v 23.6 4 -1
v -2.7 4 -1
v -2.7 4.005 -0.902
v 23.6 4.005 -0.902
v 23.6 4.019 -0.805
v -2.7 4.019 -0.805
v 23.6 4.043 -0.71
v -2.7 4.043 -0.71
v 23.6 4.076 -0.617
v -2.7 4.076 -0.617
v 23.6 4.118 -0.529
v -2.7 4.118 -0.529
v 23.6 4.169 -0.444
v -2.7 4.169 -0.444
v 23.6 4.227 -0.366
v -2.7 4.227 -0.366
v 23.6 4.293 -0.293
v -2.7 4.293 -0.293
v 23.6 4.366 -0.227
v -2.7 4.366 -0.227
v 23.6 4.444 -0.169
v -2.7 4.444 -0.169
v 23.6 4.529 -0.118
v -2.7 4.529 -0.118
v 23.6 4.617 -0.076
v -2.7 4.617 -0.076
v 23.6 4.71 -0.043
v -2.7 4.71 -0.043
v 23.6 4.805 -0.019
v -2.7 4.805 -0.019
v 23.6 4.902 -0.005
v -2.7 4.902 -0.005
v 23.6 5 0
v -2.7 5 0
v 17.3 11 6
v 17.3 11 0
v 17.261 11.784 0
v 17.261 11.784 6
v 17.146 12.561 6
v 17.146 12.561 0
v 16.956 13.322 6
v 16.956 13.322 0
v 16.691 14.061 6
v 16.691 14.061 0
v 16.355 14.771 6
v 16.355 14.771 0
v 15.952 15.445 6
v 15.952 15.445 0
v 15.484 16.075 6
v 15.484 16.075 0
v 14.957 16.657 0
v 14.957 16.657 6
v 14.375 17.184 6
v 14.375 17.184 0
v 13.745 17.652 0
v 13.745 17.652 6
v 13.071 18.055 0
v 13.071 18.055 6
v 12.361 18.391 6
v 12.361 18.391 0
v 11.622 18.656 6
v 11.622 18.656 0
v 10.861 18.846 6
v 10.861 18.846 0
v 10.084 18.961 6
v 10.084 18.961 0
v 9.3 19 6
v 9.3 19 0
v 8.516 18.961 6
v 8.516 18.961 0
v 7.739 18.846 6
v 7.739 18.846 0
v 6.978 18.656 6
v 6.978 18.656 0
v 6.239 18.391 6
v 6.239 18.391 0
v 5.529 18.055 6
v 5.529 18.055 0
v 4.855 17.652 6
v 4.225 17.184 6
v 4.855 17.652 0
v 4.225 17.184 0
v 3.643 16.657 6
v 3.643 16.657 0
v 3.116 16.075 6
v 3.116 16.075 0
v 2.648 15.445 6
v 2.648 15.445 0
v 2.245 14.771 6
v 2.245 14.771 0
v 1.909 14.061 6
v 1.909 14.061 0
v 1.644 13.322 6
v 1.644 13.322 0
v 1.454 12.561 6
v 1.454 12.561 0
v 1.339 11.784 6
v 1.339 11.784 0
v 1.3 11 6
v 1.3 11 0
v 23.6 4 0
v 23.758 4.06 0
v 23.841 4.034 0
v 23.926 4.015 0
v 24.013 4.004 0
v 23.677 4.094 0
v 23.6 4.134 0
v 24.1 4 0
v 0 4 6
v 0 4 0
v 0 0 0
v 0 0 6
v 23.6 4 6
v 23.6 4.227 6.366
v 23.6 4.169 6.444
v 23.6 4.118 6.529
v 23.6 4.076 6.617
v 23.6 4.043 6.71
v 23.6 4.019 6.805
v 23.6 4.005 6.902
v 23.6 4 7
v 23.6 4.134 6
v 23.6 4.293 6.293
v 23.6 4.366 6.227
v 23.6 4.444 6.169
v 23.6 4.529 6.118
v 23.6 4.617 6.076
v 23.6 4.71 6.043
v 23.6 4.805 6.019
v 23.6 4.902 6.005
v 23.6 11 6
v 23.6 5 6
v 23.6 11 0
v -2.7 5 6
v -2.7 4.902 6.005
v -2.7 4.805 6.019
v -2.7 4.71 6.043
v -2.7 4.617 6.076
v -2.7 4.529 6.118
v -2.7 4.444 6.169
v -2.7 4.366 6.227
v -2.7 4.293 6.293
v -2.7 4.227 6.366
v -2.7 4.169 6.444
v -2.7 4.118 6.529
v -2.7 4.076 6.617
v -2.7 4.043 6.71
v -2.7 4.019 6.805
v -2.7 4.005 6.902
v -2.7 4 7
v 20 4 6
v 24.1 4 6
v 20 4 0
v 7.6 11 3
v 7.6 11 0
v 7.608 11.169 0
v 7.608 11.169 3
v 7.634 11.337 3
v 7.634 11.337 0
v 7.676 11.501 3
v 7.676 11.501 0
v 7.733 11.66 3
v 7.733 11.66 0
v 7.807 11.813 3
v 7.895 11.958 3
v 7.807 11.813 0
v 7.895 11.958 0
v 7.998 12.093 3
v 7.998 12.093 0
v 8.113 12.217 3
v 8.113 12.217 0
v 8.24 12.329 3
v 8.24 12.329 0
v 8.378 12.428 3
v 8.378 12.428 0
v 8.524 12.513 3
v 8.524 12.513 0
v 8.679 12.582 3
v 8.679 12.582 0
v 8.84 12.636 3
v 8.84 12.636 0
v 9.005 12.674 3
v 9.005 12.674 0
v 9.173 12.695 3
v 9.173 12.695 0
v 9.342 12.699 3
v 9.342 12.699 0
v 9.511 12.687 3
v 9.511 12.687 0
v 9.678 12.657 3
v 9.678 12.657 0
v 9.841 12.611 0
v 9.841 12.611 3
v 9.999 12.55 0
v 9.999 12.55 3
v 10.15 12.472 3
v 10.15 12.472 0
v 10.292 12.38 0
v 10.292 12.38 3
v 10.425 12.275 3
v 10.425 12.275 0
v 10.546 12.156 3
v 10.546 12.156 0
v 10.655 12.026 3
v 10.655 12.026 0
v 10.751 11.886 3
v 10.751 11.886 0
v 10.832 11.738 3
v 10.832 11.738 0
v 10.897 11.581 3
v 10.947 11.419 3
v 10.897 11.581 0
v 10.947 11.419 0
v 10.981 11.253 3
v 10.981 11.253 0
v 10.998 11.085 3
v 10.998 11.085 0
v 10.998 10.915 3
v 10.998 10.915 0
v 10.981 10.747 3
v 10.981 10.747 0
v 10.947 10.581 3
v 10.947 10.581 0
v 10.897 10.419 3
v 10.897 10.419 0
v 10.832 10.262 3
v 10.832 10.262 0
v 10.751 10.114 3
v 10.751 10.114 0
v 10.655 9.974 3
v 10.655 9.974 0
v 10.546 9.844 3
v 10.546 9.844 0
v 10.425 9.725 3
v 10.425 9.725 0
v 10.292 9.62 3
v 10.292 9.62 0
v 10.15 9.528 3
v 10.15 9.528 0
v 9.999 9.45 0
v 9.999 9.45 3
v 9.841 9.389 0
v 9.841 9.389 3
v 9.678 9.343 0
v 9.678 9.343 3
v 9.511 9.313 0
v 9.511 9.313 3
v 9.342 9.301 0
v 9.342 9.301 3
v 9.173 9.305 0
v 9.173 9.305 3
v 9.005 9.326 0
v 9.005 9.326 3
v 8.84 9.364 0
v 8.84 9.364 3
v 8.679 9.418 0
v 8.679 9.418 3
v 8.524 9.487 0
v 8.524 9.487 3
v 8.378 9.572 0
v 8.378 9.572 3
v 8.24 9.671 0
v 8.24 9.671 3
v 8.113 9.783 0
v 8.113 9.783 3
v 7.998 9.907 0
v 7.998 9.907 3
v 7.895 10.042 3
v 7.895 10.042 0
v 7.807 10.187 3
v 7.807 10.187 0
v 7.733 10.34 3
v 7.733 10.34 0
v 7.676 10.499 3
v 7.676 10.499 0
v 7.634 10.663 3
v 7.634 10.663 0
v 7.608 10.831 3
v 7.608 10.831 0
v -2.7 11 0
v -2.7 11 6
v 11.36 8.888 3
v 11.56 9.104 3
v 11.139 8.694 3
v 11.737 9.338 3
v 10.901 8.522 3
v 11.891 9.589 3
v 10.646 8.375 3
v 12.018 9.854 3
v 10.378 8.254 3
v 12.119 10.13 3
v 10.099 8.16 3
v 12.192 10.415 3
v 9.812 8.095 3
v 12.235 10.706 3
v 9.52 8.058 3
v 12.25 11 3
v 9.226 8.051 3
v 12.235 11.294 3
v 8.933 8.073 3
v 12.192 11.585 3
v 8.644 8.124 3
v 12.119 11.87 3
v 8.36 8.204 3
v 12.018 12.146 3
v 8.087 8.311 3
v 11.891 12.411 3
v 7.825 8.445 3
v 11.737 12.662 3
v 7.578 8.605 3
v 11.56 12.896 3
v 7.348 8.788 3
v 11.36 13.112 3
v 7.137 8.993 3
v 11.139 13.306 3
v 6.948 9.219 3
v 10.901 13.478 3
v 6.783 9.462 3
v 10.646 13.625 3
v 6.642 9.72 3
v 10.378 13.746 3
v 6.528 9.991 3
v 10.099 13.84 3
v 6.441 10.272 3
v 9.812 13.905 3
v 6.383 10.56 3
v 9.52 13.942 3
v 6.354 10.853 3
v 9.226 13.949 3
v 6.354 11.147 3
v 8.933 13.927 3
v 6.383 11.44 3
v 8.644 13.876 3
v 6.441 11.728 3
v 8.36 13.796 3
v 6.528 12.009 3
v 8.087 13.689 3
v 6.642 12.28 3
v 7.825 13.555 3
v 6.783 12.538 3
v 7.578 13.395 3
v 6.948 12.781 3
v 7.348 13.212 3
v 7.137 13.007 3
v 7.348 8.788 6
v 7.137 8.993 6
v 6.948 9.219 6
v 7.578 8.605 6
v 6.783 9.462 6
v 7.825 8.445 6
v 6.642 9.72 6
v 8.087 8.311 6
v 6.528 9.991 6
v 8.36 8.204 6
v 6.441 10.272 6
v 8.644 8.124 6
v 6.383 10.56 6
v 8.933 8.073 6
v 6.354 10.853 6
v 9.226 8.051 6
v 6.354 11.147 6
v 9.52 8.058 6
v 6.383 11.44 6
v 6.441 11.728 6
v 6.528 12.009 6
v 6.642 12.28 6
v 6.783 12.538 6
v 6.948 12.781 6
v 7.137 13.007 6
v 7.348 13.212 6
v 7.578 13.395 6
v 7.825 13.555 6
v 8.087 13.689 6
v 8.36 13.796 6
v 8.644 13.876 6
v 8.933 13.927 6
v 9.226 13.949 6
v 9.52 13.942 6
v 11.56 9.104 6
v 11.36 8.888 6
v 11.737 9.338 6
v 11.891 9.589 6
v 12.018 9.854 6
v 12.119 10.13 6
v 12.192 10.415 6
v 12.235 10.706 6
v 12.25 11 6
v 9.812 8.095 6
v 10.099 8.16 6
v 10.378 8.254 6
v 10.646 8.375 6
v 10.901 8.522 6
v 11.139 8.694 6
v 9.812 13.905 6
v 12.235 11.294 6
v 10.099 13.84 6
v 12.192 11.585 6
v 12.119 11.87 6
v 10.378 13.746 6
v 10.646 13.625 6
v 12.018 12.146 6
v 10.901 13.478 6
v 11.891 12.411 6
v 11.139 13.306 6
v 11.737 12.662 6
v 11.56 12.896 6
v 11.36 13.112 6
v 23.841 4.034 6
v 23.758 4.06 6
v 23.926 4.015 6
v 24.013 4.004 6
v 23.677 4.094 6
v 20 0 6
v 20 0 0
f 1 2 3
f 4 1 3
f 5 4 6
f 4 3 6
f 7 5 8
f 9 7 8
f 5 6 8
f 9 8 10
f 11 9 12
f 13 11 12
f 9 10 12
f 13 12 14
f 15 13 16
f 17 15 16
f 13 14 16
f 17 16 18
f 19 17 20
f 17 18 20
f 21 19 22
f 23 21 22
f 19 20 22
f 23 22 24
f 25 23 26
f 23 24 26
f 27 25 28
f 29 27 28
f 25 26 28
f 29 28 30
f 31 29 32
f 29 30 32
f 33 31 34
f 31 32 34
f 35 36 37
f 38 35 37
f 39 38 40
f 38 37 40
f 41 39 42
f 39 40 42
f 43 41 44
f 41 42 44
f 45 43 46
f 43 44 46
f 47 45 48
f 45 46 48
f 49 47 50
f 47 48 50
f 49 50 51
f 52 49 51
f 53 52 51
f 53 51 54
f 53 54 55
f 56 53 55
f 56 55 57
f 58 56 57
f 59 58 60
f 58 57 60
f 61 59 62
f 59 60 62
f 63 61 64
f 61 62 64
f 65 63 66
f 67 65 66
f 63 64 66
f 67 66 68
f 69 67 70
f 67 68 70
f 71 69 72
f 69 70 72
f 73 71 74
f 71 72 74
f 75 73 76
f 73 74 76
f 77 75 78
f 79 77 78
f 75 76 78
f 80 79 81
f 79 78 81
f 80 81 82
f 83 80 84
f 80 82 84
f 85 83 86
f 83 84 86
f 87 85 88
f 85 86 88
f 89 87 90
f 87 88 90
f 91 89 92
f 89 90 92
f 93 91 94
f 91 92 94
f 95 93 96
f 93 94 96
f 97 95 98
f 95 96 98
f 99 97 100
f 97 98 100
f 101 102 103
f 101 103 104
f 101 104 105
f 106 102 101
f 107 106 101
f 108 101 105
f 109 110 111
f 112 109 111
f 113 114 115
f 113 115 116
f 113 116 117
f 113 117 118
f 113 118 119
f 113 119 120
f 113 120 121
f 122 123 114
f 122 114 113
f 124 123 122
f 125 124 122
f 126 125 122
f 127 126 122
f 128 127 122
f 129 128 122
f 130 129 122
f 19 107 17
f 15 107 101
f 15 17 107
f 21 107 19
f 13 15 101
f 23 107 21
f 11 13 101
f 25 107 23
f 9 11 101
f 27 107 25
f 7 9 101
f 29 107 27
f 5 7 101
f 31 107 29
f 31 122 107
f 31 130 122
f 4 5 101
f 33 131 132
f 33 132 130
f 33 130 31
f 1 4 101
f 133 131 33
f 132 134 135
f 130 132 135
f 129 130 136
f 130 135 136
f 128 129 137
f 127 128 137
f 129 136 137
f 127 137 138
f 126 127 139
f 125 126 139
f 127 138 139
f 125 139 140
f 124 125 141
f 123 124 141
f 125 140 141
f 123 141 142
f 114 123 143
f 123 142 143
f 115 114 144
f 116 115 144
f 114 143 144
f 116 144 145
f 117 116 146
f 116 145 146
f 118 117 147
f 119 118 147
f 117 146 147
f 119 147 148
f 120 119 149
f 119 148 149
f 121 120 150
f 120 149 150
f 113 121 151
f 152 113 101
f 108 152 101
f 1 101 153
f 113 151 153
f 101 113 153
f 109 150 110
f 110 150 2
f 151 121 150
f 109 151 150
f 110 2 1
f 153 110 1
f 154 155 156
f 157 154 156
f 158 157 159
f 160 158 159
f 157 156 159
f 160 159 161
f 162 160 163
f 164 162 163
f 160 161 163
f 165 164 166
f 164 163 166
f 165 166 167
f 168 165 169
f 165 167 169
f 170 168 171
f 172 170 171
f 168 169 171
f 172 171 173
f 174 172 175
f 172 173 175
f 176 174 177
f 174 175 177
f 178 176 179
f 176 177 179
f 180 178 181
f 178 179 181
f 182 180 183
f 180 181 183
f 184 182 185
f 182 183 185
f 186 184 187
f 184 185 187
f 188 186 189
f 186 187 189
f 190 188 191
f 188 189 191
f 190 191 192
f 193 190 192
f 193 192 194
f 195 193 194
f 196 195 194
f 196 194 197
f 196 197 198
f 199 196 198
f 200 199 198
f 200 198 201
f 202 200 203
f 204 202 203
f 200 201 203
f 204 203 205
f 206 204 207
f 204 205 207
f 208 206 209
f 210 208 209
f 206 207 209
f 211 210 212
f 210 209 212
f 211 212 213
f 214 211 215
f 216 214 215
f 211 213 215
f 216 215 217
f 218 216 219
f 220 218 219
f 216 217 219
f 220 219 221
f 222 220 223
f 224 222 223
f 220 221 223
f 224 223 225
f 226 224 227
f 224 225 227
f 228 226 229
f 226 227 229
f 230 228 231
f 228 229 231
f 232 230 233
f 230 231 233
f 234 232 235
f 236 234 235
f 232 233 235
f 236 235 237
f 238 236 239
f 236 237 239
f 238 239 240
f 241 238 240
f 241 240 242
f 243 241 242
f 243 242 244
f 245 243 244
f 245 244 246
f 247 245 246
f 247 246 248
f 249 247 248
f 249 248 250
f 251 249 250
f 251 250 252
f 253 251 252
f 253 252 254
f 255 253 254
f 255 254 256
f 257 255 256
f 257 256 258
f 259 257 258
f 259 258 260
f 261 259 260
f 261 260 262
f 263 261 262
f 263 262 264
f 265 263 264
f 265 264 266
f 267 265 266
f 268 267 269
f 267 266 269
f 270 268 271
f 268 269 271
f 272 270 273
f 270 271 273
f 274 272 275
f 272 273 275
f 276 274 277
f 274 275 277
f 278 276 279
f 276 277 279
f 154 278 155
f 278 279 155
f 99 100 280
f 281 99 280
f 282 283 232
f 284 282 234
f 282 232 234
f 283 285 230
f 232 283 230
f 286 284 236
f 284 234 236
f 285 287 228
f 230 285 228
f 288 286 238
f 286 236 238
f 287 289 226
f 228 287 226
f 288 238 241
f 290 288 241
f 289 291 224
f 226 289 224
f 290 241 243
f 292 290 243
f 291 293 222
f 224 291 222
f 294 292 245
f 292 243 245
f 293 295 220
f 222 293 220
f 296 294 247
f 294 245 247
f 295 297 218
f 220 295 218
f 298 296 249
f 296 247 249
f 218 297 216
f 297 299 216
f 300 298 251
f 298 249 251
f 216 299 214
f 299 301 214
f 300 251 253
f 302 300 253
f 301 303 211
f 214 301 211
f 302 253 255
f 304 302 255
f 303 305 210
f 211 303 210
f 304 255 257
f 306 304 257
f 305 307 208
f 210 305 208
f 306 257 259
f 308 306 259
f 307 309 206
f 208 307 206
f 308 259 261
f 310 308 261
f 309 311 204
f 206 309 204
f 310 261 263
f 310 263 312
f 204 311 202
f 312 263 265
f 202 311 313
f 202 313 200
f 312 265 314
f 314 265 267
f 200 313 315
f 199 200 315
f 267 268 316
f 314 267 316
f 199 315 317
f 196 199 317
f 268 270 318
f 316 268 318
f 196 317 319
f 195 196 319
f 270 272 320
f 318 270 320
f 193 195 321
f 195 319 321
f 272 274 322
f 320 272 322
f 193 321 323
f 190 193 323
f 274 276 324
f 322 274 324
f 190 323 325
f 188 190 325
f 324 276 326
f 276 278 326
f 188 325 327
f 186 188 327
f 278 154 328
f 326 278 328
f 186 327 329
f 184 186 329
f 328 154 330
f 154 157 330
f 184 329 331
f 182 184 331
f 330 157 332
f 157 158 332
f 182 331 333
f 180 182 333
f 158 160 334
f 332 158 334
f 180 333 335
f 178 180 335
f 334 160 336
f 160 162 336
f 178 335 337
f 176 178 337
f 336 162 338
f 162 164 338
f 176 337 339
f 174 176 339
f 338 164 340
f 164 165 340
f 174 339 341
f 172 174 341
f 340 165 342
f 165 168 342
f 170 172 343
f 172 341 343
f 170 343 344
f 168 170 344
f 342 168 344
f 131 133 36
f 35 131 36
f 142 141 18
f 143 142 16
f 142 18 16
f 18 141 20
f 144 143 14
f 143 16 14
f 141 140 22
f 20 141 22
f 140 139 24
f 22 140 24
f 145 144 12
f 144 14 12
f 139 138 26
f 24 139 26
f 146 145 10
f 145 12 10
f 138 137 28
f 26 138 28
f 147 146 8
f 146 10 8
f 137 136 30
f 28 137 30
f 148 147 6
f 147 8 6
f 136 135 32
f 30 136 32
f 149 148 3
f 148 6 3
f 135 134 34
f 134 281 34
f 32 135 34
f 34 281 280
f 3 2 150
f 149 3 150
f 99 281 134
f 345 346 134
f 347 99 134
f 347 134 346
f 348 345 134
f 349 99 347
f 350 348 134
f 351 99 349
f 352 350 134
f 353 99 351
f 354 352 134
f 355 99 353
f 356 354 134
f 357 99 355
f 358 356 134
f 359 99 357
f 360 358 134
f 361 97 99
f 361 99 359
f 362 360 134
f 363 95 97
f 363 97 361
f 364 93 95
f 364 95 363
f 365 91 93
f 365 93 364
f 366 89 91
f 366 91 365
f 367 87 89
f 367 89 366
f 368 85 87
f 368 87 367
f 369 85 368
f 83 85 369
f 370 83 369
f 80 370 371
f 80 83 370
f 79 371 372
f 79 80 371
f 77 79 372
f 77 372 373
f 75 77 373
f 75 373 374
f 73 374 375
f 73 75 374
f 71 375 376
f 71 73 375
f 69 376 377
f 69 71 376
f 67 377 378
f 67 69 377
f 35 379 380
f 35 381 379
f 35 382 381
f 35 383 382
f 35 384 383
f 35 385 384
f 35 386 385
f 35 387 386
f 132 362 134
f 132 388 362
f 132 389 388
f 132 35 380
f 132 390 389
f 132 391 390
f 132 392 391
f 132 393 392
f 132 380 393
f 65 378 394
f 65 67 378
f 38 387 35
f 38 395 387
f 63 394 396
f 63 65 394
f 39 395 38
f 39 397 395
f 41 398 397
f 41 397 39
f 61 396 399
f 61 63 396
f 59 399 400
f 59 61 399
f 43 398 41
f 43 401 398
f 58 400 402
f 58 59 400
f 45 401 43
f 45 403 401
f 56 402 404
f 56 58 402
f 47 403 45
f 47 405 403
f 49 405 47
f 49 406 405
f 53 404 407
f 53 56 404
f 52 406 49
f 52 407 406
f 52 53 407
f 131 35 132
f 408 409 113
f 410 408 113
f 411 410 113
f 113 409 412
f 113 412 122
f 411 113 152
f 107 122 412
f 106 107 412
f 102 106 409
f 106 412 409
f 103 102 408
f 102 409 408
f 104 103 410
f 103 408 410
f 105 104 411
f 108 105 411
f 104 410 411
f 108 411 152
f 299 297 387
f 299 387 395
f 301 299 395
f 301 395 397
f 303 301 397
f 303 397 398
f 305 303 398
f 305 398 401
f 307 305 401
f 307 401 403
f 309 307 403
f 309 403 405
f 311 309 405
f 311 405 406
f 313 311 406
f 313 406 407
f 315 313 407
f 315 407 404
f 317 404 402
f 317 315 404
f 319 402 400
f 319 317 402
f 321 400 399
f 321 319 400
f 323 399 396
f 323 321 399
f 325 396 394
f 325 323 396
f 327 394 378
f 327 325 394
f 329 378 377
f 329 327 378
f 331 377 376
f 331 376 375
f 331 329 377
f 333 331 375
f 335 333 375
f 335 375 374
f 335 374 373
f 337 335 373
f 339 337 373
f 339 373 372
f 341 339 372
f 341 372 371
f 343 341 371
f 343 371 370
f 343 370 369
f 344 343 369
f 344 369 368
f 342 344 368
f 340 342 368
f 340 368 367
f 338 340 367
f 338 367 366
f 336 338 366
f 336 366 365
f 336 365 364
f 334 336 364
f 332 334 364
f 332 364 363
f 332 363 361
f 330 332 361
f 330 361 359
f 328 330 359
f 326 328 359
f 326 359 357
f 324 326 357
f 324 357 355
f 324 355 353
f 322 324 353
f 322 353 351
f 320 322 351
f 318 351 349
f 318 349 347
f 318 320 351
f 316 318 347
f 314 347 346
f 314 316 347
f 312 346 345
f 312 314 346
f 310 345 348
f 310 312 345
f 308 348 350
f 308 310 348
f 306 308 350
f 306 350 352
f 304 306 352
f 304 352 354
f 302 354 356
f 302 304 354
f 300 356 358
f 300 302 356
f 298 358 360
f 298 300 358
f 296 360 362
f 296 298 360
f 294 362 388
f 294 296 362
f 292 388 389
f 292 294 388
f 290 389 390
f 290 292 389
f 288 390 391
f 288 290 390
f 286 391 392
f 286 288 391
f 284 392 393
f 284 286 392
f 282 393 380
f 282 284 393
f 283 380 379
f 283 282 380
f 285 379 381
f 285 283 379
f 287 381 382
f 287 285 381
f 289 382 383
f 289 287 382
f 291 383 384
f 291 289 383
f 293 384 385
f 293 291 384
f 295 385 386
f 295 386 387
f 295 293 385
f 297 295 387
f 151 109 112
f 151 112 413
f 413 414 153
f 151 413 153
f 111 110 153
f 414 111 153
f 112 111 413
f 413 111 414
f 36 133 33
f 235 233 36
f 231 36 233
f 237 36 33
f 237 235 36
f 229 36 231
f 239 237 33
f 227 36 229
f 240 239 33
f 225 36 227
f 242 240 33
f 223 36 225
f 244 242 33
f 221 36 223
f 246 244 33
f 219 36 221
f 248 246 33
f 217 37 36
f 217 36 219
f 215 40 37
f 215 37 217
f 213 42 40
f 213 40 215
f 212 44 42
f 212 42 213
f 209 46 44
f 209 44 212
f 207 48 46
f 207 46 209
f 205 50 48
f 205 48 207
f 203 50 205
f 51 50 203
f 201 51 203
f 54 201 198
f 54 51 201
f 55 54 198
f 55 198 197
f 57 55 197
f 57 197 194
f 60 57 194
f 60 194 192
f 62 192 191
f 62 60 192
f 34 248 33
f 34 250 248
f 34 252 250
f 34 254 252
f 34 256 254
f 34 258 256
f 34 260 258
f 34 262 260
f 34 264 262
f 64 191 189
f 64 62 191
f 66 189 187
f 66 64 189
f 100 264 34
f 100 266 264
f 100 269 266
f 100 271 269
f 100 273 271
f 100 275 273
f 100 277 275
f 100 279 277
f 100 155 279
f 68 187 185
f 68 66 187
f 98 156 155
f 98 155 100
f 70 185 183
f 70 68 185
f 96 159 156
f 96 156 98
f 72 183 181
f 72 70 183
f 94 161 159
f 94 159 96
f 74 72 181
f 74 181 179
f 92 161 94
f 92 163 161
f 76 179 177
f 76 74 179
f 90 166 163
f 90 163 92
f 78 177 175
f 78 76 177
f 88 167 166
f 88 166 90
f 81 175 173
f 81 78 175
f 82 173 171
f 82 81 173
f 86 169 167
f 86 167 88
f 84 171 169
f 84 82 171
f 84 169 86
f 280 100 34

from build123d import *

# Parameters (mm, degrees)
SKETCH1_R           = 2.95
BOSS_EXTRUDE1_DEPTH = 6
BOSS_EXTRUDE2_DEPTH = 26.3
BOSS_EXTRUDE3_DEPTH = 6
SKETCH5_R           = 2.95
SKETCH5_R_2         = 1.7
BOSS_EXTRUDE4_DEPTH = 3


with BuildPart() as part:
    # Sketch1 → Boss-Extrude1 (new body)
    with BuildSketch(Plane.XY):
        with BuildLine():
            Line((0, 0), (20, 0))
            Line((20, 0), (20, 4))
            Line((20, 4), (23.6, 4))
            Line((23.6, 4), (23.6, 11))
            Line((23.6, 11), (17.3, 11))
            ThreePointArc((17.3, 11), (9.3, 19), (1.3, 11))
            Line((1.3, 11), (-2.7, 11))
            Line((-2.7, 11), (-2.7, 4))
            Line((-2.7, 4), (0, 4))
            Line((0, 4), (0, 0))
        make_face()
        with Locations((9.3, 11)):
            Circle(SKETCH1_R, mode=Mode.SUBTRACT)
    extrude(amount=BOSS_EXTRUDE1_DEPTH)

    # Sketch2 → Boss-Extrude2 (add)
    with BuildSketch(Plane.ZY.offset(2.7)):
        with BuildLine():
            Line((6, 4), (6, 5))
            ThreePointArc((6, 5), (6.292893219, 4.292893219), (7, 4))
            Line((7, 4), (6, 4))
        make_face()
        with BuildLine():
            Line((0, 4), (-1, 4))
            ThreePointArc((-1, 4), (-0.292893219, 4.292893219), (0, 5))
            Line((0, 5), (0, 4))
        make_face()
    extrude(amount=-BOSS_EXTRUDE2_DEPTH)

    # Sketch4 → Boss-Extrude3 (add)
    with BuildSketch(Plane.XY.offset(6)):
        with BuildLine():
            Line((23.1, 4), (23.1, 5))
            ThreePointArc((23.1, 5), (23.392893219, 4.292893219), (24.1, 4))
            Line((24.1, 4), (23.1, 4))
        make_face()
        with BuildLine():
            Line((-1.5, 4), (-2.5, 4))
            ThreePointArc((-2.5, 4), (-1.792893219, 4.292893219), (-1.5, 5))
            Line((-1.5, 5), (-1.5, 4))
        make_face()
    extrude(amount=-BOSS_EXTRUDE3_DEPTH)

    # Sketch5 → Boss-Extrude4 (add)
    with BuildSketch(Plane(origin=(0, 0, 0), x_dir=(-1, 0, 0), z_dir=(0, 0, -1))):
        with Locations((-9.3, 11)):
            Circle(SKETCH5_R)
        with Locations((-9.3, 11)):
            Circle(SKETCH5_R_2, mode=Mode.SUBTRACT)
    extrude(amount=-BOSS_EXTRUDE4_DEPTH)


solid = part.part
